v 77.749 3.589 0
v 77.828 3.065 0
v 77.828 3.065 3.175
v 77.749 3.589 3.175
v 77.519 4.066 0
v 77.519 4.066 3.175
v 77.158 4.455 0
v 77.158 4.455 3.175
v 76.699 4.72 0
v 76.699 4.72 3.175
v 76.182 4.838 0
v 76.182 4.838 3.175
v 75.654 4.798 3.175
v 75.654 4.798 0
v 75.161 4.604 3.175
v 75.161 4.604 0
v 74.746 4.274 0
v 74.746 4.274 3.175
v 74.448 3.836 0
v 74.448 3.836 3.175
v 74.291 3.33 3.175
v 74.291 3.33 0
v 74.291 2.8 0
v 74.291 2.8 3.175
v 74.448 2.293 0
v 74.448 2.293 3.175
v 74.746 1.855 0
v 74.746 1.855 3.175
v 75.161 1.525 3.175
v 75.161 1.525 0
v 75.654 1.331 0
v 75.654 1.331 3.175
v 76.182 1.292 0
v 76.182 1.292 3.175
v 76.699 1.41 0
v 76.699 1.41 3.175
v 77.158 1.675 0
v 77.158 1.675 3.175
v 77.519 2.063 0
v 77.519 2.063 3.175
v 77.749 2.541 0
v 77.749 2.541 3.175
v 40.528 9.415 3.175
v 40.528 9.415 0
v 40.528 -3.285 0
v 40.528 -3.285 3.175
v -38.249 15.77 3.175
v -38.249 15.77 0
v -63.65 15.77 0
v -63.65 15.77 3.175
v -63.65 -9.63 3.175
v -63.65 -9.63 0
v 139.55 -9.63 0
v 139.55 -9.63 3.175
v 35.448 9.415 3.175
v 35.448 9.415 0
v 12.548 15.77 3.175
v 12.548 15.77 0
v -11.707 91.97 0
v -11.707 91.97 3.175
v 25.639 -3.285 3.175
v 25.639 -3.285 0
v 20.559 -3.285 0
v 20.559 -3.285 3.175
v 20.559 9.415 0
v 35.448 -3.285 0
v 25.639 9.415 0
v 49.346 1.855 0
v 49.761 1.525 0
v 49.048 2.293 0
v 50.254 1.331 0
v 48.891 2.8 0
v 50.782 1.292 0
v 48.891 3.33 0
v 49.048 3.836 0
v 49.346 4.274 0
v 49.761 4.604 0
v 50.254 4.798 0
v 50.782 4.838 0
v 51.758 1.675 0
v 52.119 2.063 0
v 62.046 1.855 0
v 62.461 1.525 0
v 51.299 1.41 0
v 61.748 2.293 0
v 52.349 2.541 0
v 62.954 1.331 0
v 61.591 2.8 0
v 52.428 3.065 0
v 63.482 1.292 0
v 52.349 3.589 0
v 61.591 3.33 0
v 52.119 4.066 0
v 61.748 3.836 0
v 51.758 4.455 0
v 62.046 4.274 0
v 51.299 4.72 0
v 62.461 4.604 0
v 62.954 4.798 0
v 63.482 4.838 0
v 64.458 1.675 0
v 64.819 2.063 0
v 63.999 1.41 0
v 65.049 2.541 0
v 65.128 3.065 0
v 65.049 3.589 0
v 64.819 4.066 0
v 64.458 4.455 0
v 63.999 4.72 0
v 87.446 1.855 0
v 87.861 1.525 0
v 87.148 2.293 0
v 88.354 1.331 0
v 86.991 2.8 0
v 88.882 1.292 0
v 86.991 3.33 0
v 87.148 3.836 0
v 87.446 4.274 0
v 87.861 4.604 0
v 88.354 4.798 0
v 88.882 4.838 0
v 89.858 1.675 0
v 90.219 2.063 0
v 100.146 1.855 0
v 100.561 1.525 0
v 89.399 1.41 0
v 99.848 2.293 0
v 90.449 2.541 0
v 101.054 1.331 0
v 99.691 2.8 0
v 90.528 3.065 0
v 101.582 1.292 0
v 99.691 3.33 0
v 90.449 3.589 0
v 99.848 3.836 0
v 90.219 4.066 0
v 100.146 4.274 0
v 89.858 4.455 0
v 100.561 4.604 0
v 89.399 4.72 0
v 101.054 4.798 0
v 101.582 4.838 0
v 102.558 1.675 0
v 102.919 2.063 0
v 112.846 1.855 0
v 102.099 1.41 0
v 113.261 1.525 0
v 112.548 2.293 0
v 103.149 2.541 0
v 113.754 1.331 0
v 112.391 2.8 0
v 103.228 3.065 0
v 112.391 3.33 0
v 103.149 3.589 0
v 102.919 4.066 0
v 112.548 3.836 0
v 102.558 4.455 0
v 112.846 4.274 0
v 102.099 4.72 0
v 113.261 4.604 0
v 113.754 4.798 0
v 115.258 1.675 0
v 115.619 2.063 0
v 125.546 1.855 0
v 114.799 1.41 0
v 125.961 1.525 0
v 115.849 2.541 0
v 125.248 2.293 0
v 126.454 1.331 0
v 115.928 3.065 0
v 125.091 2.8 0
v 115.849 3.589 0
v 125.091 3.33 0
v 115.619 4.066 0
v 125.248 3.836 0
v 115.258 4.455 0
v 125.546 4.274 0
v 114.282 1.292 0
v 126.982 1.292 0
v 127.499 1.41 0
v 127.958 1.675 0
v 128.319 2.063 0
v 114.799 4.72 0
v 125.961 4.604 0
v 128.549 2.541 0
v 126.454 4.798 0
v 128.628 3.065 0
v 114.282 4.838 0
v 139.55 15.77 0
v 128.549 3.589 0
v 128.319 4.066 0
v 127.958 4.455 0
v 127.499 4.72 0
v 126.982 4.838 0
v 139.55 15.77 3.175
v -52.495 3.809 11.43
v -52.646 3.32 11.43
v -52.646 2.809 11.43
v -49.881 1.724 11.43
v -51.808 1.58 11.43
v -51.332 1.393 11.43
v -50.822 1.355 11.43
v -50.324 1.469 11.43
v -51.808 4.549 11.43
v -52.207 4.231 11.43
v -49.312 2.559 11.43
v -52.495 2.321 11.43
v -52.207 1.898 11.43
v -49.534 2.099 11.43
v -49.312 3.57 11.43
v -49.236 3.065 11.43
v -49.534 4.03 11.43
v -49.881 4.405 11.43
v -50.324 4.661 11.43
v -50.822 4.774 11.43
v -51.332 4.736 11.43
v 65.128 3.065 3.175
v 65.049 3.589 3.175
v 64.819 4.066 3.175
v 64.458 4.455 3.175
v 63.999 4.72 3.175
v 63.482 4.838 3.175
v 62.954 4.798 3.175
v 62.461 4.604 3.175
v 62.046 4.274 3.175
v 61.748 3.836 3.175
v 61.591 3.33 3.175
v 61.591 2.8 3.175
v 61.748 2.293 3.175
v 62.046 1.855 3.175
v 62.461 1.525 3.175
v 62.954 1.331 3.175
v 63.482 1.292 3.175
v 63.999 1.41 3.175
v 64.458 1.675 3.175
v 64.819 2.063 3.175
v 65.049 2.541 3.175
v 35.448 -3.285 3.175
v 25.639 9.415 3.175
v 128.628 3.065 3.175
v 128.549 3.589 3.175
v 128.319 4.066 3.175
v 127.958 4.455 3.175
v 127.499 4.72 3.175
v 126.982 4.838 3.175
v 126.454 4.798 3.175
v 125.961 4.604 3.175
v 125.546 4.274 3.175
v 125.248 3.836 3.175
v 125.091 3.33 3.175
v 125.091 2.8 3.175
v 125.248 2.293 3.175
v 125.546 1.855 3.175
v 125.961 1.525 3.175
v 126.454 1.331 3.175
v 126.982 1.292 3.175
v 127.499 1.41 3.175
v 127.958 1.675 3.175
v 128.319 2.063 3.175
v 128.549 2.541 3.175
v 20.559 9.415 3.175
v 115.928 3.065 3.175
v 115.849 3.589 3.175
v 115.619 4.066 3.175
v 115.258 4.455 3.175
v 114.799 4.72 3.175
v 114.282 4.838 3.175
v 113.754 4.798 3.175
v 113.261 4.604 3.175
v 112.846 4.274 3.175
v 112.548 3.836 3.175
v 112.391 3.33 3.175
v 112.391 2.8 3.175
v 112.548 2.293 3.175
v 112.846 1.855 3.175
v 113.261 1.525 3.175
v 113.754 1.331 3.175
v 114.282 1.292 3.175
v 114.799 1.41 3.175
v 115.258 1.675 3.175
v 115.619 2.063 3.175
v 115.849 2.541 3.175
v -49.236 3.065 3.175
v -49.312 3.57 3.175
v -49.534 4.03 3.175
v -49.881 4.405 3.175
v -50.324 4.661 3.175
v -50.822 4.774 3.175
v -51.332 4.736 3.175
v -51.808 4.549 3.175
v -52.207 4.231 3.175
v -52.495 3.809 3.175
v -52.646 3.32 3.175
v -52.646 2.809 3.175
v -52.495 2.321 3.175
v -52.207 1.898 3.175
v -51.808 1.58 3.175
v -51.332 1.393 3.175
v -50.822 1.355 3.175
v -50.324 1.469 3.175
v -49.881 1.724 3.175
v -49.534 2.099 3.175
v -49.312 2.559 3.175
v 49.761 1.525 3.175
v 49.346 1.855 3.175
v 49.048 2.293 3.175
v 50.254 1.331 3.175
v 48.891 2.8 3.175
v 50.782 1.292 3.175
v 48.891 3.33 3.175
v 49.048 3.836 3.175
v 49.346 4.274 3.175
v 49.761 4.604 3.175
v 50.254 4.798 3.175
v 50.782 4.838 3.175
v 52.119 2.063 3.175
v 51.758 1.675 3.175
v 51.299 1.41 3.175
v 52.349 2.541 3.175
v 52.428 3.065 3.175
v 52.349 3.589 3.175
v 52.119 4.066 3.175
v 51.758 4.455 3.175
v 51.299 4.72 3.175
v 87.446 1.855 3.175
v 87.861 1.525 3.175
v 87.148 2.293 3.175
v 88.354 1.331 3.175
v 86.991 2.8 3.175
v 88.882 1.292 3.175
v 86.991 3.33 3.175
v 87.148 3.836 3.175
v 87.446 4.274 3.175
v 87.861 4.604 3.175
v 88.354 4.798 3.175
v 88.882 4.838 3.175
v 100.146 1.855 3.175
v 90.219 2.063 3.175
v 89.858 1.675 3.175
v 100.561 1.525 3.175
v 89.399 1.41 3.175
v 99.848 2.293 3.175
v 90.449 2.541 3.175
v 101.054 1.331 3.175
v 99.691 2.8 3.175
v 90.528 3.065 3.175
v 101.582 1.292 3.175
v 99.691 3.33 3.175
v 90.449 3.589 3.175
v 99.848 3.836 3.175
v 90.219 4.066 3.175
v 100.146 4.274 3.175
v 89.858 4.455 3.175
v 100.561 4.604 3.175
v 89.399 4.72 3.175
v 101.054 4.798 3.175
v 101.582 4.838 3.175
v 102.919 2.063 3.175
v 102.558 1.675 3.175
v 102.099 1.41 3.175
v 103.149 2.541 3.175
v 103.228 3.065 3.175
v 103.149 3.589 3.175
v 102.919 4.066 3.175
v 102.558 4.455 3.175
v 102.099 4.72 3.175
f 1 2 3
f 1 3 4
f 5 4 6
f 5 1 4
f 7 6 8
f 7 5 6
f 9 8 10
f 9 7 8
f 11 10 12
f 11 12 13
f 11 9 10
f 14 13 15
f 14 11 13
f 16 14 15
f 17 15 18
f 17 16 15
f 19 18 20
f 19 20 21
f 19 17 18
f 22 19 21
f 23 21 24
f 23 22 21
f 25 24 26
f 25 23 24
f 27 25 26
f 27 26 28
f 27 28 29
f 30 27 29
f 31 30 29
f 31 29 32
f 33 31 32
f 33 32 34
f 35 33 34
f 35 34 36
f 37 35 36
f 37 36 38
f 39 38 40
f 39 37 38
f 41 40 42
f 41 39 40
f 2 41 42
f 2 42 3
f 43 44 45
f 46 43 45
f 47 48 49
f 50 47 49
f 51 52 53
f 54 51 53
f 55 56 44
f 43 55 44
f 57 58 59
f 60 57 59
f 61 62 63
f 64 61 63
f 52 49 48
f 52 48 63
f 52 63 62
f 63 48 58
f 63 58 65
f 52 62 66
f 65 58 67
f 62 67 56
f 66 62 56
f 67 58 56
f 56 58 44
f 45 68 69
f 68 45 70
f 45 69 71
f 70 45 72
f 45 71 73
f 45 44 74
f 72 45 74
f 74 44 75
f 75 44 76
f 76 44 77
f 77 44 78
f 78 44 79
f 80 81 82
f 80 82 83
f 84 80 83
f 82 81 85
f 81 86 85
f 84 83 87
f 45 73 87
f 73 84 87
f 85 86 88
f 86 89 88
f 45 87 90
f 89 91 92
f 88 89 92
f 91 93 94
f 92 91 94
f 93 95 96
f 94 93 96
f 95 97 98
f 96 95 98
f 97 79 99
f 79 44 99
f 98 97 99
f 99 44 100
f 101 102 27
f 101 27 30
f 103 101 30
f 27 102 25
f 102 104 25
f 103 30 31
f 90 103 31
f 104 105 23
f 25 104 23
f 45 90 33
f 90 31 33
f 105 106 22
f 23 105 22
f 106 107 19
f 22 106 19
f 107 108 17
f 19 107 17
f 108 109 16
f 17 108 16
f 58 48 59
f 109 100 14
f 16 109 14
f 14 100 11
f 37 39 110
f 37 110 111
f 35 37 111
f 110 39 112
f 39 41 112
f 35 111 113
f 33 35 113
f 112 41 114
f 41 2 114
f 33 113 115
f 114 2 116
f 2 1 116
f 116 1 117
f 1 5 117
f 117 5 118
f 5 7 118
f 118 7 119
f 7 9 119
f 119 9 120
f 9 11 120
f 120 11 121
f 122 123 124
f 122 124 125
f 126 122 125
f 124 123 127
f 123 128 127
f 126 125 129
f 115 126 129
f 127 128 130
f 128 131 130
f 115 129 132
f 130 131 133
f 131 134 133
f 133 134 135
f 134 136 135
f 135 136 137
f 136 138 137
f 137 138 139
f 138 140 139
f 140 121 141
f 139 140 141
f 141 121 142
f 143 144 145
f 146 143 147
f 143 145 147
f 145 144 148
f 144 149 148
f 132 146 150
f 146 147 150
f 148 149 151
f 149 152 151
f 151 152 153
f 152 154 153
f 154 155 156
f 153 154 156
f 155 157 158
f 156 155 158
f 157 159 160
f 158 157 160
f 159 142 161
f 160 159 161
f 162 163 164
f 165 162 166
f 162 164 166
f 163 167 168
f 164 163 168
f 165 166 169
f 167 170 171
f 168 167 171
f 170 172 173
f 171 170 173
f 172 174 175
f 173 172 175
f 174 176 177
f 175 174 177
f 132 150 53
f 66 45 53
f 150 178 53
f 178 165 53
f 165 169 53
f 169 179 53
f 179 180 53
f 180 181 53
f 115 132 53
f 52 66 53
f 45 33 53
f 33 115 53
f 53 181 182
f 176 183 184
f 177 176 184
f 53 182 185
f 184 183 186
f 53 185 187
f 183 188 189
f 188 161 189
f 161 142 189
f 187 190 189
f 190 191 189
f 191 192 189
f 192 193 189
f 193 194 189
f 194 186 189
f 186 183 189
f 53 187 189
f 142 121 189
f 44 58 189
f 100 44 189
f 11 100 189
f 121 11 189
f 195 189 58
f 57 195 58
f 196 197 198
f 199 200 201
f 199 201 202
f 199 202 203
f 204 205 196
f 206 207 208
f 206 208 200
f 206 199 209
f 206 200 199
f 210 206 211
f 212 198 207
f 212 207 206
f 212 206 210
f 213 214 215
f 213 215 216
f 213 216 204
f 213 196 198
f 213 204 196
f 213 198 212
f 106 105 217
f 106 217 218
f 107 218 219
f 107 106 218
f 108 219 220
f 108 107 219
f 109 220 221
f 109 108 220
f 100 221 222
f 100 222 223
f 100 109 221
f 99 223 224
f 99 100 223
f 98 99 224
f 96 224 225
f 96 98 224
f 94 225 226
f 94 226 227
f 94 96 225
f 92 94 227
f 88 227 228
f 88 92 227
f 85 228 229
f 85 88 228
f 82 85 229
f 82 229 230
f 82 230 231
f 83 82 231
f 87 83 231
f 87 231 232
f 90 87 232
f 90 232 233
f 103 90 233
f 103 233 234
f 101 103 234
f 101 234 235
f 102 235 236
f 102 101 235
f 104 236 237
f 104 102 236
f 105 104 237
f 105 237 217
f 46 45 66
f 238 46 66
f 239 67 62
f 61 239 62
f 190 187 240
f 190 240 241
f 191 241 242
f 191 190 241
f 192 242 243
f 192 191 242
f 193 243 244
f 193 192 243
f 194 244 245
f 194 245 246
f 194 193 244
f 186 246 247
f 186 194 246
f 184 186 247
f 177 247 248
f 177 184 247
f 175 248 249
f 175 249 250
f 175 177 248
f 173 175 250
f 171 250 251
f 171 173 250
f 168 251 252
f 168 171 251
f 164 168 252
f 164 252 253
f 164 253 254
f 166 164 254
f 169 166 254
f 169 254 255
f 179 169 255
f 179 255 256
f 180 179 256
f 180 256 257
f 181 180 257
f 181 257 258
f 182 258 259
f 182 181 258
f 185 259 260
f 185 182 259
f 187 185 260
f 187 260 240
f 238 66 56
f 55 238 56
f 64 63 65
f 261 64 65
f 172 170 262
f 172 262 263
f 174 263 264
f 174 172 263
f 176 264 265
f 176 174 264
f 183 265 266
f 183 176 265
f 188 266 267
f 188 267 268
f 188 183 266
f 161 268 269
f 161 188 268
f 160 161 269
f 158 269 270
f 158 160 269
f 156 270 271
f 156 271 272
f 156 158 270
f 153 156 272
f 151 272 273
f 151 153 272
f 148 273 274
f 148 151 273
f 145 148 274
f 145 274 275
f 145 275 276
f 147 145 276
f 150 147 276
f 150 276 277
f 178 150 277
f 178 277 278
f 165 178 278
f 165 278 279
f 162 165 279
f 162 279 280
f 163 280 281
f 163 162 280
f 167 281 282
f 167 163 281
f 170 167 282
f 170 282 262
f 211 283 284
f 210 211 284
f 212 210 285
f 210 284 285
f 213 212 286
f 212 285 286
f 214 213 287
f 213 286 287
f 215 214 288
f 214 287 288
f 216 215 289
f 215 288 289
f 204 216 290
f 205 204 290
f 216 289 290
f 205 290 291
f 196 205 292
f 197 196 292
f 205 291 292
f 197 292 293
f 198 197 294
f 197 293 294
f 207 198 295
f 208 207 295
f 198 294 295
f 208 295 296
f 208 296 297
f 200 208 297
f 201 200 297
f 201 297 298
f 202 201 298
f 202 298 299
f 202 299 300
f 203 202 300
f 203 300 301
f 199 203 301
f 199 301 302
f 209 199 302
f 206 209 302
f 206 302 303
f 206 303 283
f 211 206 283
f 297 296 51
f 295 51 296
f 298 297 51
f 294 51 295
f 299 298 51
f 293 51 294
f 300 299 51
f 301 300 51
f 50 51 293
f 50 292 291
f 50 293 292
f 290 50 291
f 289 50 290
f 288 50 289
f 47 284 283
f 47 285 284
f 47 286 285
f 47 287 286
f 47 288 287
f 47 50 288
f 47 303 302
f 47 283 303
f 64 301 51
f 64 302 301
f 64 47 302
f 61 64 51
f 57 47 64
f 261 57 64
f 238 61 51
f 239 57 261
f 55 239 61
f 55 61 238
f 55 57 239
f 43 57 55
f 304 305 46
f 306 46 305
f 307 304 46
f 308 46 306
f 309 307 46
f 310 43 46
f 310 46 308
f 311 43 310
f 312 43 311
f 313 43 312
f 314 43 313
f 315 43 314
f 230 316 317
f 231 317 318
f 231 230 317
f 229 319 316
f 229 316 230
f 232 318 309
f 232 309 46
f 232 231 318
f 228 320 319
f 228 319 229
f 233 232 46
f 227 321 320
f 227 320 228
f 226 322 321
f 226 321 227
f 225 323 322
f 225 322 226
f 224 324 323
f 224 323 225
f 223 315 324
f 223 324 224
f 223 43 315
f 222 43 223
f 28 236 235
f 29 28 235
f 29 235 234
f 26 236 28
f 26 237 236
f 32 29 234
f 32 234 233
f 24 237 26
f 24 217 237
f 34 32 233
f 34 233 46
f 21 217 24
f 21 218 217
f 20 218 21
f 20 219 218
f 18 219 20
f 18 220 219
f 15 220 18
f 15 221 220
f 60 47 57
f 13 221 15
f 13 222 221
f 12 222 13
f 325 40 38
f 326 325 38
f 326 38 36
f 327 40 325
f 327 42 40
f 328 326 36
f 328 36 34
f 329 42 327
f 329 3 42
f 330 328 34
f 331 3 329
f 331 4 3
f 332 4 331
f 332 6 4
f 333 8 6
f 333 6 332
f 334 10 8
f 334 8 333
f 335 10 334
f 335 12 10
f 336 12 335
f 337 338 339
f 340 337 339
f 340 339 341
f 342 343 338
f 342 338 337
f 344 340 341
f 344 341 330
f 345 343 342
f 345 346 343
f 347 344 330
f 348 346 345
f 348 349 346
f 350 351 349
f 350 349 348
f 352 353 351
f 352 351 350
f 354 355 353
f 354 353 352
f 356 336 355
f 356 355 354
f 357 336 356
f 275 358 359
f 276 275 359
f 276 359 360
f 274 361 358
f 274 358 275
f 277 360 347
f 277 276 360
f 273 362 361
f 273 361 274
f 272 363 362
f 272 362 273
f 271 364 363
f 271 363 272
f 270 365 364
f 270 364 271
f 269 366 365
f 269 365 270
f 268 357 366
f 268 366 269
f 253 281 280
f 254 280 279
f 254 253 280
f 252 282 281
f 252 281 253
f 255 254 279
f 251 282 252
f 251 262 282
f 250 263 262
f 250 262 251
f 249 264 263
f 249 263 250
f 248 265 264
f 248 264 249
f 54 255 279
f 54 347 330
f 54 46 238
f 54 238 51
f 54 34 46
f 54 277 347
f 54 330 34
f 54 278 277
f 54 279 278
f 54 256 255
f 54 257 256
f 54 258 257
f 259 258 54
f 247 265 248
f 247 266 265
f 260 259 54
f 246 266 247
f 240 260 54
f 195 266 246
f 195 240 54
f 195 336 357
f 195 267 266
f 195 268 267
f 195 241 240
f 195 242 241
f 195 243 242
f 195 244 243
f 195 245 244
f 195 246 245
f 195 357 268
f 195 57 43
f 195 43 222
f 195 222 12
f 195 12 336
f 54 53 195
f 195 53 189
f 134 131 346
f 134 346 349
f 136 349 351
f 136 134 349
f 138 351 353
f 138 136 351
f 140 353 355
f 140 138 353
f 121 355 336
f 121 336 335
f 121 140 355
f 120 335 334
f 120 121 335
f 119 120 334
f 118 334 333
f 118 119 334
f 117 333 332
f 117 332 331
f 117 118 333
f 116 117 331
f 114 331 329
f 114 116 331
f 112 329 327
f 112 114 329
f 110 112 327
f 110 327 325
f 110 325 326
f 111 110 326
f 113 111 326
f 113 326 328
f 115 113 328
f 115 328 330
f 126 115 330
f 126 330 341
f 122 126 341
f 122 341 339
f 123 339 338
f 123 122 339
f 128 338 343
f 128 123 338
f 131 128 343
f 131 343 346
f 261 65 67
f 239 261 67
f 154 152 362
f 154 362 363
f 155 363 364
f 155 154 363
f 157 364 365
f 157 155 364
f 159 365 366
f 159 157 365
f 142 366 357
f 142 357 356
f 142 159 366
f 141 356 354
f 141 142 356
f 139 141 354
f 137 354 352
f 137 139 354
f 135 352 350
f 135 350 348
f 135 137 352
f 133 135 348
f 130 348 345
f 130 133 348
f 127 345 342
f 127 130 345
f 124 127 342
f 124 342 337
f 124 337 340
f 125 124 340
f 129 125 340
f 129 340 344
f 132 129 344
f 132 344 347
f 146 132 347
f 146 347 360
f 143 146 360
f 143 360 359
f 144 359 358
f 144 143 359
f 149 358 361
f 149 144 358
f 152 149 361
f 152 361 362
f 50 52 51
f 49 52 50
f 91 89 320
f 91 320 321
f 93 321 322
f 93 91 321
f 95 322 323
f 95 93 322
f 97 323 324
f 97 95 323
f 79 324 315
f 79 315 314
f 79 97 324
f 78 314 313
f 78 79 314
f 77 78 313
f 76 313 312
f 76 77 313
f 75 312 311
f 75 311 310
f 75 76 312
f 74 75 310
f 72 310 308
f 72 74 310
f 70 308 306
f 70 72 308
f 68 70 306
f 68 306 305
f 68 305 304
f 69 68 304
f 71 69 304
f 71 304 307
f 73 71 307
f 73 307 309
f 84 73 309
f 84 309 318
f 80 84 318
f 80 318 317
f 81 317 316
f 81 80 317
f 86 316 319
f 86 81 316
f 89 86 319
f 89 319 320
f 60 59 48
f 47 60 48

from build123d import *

# Parameters (mm, degrees)
F0_R     = 1.778
F0_W     = 19.05
F0_H     = 25.4
F0_R_2   = 1.7145
F1_DEPTH = 3.175
F2_DEPTH = 11.43


# Not quite as in the source:
# - a feature names something its author has since deleted; it is built from what else it names


with BuildPart() as f1:
    # F0 (on Top) → F1 (new body)
    with BuildSketch(Plane.XY):
        Polygon((-38.2503936946, 15.7646441165), (-38.2503936946, -9.6299967694), (139.5496063054, -9.6299967694), (139.5496063054, 15.7700032306), (12.5479004732, 15.7700032306), (-11.7069316009, 15.7700032306), (-38.2485270353, 15.7700032306), align=None)
        Polygon((20.5585099757, -3.2853558835), (20.5585099757, 3.0646441165), (20.5585099757, 9.4146441165), (25.6385099757, 9.4146441165), (25.6385099757, -3.2853558835), align=None, mode=Mode.SUBTRACT)
        Polygon((35.4481115937, -3.2853558835), (35.4481115937, 3.0646441165), (35.4481115937, 9.4146441165), (40.5281115937, 9.4146441165), (40.5281115937, -3.2853558835), align=None, mode=Mode.SUBTRACT)
        with Locations((50.6496063054, 3.0646441165)):
            Circle(F0_R, mode=Mode.SUBTRACT)
        with Locations((63.3496063054, 3.0646441165)):
            Circle(F0_R, mode=Mode.SUBTRACT)
        with Locations((76.0496063054, 3.0646441165)):
            Circle(F0_R, mode=Mode.SUBTRACT)
        with Locations((88.7496063054, 3.0646441165)):
            Circle(F0_R, mode=Mode.SUBTRACT)
        with Locations((101.4496063054, 3.0646441165)):
            Circle(F0_R, mode=Mode.SUBTRACT)
        with Locations((114.1496063054, 3.0646441165)):
            Circle(F0_R, mode=Mode.SUBTRACT)
        with Locations((126.8496063054, 3.0646441165)):
            Circle(F0_R, mode=Mode.SUBTRACT)
        Polygon((-44.6003936946, 15.7700032306), (-44.6003936946, -9.6299967694), (-38.2503936946, -9.6299967694), (-38.2503936946, 15.7646441165), (-38.2485270353, 15.7700032306), align=None)
        with Locations((-54.1253936946, 3.0700032306)):
            Rectangle(F0_W, F0_H)
        with Locations((-50.9503936946, 3.0646441165)):
            Circle(F0_R_2, mode=Mode.SUBTRACT)
        Polygon((-11.7069316009, 91.9700032306), (-38.2485270353, 15.7700032306), (-11.7069316009, 15.7700032306), align=None)
        Polygon((-11.7069316009, 91.9700032306), (-11.7069316009, 15.7700032306), (12.5479004732, 15.7700032306), align=None)
    extrude(amount=F1_DEPTH)

    # F0 (on Top) → F2 (join)
    with BuildSketch(Plane.XY):
        with Locations((-50.9503936946, 3.0646441165)):
            Circle(F0_R_2)
    extrude(amount=F2_DEPTH)


solid = f1.part
